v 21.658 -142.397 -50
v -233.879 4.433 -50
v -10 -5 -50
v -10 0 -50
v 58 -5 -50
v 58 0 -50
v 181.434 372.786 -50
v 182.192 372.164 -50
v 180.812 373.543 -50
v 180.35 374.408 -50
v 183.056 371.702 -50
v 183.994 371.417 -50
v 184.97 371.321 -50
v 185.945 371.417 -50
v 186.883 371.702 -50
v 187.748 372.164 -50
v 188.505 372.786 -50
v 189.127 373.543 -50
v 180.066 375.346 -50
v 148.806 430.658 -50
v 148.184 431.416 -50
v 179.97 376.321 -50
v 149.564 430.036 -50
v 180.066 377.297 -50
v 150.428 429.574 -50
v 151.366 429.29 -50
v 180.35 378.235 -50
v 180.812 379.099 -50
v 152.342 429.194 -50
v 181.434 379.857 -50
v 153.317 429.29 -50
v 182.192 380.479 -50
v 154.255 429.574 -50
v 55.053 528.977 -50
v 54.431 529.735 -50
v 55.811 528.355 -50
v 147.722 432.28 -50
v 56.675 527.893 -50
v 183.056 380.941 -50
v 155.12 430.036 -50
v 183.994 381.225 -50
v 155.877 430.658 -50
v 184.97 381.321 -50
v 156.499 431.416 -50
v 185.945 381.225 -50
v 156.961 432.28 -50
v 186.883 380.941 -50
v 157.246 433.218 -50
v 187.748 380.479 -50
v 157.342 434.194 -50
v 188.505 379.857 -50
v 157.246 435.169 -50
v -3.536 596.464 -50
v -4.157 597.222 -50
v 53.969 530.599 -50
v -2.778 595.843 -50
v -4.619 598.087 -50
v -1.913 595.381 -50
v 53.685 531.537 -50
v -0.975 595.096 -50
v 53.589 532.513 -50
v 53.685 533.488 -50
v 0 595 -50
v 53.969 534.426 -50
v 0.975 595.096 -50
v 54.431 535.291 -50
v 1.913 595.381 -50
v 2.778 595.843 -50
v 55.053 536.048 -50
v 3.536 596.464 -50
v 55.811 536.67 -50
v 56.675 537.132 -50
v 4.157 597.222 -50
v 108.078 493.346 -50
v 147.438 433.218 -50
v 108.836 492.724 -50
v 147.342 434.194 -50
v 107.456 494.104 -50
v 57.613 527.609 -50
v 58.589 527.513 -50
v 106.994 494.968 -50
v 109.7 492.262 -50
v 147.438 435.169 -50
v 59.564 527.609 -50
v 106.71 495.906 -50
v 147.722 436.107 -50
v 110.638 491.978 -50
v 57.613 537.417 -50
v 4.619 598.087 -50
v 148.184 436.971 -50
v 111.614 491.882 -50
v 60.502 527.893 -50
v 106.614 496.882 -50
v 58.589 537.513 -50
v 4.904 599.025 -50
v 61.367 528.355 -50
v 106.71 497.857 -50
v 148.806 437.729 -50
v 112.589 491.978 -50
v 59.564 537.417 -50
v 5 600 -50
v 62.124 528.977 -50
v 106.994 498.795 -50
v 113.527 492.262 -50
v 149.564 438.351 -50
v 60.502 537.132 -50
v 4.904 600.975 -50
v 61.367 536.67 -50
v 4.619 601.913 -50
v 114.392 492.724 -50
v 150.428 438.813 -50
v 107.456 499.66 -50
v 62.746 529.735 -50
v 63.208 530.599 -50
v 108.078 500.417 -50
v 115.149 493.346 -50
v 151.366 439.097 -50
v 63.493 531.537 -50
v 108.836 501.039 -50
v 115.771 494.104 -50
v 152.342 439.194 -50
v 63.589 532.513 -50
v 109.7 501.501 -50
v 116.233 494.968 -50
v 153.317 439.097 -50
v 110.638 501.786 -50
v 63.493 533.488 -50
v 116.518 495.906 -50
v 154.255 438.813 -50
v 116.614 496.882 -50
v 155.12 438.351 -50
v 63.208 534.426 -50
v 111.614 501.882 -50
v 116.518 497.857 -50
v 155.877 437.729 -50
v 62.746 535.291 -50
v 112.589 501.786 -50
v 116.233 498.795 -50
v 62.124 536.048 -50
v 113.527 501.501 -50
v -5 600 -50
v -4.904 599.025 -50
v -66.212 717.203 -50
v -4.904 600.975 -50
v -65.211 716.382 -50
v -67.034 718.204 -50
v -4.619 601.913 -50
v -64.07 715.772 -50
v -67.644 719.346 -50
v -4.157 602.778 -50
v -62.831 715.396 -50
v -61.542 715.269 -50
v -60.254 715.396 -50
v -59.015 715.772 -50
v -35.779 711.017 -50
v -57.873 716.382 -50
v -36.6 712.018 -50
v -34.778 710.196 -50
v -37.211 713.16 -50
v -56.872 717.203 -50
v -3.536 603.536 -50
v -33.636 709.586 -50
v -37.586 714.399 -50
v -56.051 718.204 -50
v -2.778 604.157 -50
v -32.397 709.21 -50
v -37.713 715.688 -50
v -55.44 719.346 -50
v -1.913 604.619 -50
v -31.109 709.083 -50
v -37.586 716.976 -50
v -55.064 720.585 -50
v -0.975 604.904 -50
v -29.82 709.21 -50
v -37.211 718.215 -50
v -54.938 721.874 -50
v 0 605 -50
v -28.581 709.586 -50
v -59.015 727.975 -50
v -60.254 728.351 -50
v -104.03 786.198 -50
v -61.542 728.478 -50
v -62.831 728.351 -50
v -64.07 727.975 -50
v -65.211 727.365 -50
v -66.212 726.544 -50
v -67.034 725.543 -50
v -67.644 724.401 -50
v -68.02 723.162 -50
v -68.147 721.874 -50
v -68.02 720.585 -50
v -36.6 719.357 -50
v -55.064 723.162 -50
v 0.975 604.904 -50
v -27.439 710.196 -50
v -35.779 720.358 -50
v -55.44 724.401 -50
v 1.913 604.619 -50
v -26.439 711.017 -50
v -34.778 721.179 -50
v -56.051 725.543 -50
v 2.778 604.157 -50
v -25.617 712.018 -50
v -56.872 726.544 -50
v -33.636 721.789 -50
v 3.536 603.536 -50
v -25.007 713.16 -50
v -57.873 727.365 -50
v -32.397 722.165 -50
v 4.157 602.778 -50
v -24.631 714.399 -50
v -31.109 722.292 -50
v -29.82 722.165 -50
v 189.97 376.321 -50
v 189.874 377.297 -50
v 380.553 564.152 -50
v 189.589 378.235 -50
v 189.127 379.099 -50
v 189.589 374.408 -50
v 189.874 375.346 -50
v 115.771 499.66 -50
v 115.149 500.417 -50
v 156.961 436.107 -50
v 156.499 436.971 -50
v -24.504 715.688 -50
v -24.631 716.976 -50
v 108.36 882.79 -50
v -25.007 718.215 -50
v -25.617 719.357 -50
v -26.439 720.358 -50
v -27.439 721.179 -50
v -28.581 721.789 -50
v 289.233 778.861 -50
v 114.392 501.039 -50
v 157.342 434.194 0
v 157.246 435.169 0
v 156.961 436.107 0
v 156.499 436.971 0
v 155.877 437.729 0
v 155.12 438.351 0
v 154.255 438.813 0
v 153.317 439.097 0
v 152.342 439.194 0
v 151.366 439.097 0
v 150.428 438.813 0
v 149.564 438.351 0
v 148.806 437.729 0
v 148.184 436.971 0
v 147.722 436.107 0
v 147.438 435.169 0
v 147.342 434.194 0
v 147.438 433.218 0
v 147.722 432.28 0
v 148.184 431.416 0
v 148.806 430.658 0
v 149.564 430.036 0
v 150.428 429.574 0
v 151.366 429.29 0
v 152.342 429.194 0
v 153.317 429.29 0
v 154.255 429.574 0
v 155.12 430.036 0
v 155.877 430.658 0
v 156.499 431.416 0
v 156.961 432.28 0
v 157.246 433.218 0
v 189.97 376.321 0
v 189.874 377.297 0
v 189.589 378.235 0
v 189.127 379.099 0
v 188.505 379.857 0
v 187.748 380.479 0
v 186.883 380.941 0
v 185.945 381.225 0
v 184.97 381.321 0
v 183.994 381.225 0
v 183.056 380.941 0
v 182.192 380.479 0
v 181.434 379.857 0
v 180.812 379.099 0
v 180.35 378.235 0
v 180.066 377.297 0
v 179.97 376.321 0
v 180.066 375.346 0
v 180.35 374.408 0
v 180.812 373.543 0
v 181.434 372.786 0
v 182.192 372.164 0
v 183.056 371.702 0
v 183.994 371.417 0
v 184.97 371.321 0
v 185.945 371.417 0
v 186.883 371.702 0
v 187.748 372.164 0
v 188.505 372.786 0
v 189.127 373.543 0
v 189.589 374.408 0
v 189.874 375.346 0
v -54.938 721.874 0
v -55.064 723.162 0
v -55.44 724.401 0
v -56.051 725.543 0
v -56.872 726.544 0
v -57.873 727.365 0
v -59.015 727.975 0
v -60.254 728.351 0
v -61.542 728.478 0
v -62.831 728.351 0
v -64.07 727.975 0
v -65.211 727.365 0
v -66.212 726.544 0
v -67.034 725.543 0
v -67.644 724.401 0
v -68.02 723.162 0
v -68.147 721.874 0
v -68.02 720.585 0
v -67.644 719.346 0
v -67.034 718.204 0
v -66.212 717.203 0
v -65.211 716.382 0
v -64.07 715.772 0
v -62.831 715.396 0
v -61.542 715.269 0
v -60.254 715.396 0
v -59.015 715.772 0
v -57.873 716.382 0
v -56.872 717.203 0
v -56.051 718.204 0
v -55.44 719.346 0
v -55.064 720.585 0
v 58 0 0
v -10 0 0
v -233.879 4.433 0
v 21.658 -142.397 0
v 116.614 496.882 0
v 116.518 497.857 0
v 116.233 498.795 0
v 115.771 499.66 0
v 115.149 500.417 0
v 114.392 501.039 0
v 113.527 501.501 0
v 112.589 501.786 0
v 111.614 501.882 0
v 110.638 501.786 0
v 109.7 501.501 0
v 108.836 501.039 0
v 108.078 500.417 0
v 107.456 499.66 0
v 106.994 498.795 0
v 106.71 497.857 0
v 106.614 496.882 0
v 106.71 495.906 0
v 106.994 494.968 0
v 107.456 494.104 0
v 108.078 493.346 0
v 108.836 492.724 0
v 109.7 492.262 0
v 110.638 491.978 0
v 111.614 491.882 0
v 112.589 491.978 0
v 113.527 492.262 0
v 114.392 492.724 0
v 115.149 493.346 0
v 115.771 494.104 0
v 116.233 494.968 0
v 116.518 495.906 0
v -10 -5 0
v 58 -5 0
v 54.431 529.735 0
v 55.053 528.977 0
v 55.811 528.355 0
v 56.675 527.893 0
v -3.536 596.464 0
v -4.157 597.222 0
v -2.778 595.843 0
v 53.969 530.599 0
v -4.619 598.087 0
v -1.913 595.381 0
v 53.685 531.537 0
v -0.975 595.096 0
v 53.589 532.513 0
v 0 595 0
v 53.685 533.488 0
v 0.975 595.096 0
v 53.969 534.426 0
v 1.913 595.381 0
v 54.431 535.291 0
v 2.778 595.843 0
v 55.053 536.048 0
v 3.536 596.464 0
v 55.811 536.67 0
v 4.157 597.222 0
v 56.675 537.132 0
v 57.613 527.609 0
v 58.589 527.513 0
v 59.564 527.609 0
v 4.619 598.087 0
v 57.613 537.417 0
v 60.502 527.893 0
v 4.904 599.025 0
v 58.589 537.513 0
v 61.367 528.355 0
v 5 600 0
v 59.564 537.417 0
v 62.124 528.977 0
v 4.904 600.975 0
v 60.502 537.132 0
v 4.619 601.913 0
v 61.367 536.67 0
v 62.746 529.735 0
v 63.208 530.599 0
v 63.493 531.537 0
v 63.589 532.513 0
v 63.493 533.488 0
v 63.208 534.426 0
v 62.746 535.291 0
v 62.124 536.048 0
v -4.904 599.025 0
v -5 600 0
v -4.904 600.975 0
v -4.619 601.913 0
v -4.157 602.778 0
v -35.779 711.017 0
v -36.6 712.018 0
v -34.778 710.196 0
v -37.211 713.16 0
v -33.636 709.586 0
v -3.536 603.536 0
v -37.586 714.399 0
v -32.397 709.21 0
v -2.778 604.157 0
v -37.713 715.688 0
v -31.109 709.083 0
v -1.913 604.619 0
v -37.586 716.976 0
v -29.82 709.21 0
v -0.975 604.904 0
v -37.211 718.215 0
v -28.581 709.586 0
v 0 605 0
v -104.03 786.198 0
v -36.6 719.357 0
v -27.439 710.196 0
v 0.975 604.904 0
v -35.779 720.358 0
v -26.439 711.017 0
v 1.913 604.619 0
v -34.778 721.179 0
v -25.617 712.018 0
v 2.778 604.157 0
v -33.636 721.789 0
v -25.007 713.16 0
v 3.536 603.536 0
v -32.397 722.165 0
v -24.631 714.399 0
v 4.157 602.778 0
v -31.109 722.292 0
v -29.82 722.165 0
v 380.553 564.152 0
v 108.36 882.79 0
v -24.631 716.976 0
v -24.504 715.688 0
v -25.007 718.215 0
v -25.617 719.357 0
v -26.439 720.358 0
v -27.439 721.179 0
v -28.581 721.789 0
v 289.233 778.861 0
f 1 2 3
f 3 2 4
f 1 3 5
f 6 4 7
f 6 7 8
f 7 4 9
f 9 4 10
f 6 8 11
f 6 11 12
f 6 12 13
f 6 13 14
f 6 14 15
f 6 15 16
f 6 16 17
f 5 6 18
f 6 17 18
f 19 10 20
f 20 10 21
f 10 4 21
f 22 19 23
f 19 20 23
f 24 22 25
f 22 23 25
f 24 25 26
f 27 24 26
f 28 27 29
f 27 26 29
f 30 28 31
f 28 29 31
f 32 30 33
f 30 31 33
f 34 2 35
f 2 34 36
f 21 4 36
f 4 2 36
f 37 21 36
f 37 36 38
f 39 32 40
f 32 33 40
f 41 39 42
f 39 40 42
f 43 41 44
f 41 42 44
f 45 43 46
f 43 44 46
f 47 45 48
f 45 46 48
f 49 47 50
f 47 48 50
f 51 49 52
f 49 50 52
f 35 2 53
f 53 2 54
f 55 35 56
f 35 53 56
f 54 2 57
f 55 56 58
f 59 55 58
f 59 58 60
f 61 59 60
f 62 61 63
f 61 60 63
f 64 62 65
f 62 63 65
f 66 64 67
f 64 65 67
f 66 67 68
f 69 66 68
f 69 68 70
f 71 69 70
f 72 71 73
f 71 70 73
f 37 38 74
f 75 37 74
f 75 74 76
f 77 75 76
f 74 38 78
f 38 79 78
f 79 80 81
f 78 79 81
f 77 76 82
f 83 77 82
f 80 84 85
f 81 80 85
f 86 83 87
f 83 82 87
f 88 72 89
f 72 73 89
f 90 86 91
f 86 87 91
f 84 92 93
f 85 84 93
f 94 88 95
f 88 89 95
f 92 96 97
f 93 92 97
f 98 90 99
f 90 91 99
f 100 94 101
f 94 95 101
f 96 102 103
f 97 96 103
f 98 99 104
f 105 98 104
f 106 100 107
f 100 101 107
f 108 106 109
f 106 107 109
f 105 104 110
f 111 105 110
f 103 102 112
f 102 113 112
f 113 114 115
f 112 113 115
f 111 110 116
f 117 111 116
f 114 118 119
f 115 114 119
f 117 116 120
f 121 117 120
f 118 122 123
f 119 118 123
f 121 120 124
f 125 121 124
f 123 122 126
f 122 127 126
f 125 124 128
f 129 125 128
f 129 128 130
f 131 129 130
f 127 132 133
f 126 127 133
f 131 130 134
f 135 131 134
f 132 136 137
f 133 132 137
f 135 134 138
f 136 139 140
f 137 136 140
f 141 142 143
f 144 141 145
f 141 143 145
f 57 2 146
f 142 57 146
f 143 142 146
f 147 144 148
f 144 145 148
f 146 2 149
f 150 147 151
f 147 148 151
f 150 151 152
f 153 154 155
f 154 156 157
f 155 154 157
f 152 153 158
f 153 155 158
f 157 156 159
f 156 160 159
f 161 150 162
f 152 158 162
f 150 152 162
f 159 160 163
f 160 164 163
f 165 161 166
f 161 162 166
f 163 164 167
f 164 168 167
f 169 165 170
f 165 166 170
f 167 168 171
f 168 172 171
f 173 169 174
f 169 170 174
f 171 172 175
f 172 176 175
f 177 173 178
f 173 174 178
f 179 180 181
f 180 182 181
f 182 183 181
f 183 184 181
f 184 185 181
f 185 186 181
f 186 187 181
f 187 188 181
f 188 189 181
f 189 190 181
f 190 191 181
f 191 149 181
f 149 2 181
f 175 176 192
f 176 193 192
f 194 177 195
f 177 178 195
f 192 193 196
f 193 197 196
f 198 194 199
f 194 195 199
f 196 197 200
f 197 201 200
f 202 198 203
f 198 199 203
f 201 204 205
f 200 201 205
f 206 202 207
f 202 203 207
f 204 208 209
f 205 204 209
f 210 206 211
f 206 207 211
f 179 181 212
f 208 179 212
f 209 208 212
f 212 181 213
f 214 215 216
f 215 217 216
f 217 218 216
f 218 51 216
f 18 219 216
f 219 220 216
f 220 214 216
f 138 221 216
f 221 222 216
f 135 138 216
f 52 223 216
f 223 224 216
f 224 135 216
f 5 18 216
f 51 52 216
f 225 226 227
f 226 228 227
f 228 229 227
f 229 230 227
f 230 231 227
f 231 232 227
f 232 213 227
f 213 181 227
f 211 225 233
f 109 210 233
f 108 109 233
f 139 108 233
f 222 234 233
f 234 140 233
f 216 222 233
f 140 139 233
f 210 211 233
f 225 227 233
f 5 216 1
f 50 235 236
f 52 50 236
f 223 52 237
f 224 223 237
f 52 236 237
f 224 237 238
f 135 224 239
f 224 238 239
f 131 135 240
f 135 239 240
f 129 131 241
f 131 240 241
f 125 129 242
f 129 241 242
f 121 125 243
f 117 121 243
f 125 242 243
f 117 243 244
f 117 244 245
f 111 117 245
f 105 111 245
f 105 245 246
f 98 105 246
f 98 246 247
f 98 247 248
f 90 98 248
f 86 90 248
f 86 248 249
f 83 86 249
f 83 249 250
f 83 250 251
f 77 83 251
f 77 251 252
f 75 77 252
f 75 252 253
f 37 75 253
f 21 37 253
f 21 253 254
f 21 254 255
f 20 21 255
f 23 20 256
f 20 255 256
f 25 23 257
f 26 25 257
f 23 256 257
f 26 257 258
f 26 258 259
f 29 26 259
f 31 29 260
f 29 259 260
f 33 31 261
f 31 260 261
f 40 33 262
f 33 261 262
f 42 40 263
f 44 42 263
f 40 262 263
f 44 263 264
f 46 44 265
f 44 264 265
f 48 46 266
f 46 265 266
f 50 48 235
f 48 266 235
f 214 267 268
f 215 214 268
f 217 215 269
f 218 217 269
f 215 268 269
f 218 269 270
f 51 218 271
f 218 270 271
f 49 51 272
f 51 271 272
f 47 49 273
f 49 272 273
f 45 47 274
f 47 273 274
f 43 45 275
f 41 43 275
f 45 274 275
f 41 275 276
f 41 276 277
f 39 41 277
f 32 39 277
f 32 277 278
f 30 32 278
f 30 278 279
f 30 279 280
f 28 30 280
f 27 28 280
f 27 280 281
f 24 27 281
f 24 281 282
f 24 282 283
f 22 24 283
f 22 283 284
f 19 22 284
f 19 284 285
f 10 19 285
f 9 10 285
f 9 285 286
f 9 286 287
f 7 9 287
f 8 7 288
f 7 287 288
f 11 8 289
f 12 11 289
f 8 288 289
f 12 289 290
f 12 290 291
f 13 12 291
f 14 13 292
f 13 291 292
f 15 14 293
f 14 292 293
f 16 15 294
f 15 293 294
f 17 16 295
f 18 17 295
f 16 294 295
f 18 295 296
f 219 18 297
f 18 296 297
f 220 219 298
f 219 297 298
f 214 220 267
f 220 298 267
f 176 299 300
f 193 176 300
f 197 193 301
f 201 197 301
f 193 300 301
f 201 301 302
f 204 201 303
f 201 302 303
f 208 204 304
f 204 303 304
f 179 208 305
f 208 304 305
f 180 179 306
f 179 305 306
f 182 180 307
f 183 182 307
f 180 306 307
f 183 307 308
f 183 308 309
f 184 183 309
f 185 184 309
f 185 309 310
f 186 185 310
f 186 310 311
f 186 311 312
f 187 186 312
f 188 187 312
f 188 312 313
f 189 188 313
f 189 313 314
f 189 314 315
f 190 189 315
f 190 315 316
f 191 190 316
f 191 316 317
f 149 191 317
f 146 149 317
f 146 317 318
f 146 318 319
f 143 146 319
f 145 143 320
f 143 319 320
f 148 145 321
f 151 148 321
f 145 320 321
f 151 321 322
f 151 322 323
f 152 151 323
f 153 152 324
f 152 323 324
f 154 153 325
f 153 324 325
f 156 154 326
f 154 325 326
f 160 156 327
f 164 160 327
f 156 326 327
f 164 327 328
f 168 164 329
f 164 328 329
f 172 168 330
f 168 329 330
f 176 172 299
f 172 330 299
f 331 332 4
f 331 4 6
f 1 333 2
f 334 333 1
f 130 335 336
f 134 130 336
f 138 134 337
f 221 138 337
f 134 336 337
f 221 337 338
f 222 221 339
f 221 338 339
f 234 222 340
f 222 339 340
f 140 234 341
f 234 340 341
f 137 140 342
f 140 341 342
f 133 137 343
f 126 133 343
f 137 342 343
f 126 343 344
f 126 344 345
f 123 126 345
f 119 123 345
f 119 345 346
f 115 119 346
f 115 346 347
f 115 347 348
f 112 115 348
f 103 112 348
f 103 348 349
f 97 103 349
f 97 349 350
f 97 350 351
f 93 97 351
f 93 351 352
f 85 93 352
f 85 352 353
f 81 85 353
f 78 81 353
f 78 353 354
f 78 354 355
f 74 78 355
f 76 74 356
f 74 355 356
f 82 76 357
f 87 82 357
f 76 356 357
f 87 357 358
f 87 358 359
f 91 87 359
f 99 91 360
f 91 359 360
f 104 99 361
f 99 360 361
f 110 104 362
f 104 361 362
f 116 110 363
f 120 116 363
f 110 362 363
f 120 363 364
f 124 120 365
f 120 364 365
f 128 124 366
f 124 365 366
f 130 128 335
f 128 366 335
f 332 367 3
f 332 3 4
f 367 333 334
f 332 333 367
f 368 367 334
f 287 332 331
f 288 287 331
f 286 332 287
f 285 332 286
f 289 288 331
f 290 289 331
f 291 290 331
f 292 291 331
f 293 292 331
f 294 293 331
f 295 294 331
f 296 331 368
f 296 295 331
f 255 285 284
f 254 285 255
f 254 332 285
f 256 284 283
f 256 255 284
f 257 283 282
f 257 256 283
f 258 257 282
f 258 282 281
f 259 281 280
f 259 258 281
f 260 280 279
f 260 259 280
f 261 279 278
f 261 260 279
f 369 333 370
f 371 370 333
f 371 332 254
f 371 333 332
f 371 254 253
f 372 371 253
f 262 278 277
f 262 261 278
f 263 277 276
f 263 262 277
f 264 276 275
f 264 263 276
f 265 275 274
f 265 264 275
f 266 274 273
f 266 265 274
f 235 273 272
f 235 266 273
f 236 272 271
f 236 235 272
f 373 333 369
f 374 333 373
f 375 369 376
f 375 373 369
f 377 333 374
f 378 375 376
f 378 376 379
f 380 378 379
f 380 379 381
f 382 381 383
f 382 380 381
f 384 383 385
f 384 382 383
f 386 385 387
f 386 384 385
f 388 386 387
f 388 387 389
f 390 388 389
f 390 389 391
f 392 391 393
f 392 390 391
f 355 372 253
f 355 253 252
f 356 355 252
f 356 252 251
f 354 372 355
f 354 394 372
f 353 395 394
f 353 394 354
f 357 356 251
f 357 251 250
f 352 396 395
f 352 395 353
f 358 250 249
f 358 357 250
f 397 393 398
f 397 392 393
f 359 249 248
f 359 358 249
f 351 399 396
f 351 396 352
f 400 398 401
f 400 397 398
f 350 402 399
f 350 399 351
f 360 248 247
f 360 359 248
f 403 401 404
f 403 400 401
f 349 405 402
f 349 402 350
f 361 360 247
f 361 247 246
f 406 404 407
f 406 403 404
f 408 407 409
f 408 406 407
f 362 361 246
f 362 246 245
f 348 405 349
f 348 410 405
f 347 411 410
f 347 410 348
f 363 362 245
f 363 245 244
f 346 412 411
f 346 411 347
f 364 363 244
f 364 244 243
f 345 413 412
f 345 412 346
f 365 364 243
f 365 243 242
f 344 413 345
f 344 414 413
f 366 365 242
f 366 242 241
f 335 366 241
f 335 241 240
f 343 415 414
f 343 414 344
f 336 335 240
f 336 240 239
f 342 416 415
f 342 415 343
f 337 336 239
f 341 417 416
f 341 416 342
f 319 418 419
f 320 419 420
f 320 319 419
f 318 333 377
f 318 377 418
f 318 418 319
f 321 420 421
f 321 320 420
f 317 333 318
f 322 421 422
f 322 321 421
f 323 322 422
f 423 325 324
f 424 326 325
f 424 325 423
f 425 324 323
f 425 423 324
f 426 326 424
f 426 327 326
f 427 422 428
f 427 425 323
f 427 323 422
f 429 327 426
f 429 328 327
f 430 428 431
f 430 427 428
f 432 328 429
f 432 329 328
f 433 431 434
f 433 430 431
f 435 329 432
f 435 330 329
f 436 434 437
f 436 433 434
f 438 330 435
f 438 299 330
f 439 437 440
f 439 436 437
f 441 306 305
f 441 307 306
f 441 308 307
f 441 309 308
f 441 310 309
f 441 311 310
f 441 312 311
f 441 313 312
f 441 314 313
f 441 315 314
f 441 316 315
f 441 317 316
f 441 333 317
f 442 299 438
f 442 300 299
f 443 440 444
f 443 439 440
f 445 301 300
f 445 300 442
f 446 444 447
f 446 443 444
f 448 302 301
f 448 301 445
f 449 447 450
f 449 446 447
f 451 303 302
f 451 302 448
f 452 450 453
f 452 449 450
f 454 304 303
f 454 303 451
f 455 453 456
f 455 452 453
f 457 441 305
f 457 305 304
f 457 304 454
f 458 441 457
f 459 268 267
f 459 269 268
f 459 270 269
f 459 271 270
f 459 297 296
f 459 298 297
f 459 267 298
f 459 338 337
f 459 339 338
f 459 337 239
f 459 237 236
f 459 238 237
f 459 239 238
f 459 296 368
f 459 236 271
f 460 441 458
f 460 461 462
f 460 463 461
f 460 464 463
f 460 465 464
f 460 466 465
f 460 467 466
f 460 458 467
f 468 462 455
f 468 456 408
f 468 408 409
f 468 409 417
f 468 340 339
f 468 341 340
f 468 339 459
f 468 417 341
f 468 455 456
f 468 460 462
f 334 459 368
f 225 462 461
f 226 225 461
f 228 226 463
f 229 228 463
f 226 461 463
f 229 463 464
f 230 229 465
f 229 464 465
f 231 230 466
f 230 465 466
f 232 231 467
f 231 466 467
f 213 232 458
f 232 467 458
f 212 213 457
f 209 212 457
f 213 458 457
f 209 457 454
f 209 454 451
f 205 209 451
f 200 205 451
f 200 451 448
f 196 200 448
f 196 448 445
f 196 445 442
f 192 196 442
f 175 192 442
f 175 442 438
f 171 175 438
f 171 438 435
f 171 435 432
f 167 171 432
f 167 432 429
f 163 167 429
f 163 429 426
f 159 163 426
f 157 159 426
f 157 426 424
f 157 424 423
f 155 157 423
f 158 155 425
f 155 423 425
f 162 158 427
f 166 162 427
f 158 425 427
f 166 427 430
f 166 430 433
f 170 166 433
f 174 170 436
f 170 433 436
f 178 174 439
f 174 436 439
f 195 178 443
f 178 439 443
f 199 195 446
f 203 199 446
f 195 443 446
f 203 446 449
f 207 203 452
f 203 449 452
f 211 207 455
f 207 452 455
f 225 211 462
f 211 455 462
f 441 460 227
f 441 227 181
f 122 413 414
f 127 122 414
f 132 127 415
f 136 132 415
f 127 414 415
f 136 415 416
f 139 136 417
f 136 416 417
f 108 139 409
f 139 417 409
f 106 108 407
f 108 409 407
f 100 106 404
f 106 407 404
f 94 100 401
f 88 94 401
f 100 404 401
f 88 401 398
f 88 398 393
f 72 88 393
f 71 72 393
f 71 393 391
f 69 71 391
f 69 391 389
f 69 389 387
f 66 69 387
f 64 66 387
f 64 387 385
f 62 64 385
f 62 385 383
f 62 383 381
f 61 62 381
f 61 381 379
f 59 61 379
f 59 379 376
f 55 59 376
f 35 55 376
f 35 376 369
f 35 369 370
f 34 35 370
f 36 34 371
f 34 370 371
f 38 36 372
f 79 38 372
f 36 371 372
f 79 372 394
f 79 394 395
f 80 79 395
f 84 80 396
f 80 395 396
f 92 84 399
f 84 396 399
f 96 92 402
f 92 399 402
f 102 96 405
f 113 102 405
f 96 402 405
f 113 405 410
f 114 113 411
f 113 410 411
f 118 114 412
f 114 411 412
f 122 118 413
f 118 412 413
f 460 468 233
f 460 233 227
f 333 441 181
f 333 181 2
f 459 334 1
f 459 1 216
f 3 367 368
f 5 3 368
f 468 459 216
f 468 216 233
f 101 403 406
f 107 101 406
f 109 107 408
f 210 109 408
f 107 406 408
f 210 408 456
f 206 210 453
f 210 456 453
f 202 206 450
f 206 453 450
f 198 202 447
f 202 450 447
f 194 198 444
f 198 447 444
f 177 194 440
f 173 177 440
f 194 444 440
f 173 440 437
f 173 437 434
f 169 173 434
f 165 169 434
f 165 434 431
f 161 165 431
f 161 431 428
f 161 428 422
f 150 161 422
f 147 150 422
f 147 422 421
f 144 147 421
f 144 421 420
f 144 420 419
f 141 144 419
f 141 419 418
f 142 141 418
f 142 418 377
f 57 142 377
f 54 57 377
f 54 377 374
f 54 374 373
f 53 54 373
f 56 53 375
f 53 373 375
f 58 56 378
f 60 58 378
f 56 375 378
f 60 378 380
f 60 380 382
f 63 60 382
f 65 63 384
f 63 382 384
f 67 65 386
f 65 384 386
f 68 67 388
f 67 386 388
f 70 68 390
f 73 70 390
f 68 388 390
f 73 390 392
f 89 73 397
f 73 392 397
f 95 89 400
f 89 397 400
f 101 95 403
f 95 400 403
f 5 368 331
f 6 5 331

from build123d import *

# Parameters (mm, degrees)
PAD_DEPTH    = 50
SKETCH_R     = 5
SKETCH_R_2   = 6.604591
SKETCH_W     = 68
SKETCH_H     = 5
POCKET_DEPTH = 50.001


with BuildPart() as part:
    # Sketch001 → Pad (new body)
    with BuildSketch(Plane.XY):
        Polygon((21.658416, -142.396888), (380.553462, 564.152424), (289.232679, 778.86121), (108.359877, 882.789603), (-104.030099, 786.198474), (-233.87883, 4.433233), align=None)
    extrude(amount=-PAD_DEPTH)

    # Sketch (on Face7 of Pad) → Pocket (cut, through all)
    with BuildSketch(Plane.XY):
        with Locations((0, 600)):
            Circle(SKETCH_R)
        with Locations((58.588821, 532.512666)):
            Circle(SKETCH_R)
        with Locations((111.61367, 496.881813)):
            Circle(SKETCH_R)
        with Locations((152.341802, 434.193515)):
            Circle(SKETCH_R)
        with Locations((184.96974, 376.321267)):
            Circle(SKETCH_R)
        with Locations((-31.108797, 715.687506)):
            Circle(SKETCH_R_2)
        with Locations((-61.54211, 721.87355)):
            Circle(SKETCH_R_2)
        with Locations((24, -2.5)):
            Rectangle(SKETCH_W, SKETCH_H)
    extrude(amount=-POCKET_DEPTH, mode=Mode.SUBTRACT)


solid = part.part
